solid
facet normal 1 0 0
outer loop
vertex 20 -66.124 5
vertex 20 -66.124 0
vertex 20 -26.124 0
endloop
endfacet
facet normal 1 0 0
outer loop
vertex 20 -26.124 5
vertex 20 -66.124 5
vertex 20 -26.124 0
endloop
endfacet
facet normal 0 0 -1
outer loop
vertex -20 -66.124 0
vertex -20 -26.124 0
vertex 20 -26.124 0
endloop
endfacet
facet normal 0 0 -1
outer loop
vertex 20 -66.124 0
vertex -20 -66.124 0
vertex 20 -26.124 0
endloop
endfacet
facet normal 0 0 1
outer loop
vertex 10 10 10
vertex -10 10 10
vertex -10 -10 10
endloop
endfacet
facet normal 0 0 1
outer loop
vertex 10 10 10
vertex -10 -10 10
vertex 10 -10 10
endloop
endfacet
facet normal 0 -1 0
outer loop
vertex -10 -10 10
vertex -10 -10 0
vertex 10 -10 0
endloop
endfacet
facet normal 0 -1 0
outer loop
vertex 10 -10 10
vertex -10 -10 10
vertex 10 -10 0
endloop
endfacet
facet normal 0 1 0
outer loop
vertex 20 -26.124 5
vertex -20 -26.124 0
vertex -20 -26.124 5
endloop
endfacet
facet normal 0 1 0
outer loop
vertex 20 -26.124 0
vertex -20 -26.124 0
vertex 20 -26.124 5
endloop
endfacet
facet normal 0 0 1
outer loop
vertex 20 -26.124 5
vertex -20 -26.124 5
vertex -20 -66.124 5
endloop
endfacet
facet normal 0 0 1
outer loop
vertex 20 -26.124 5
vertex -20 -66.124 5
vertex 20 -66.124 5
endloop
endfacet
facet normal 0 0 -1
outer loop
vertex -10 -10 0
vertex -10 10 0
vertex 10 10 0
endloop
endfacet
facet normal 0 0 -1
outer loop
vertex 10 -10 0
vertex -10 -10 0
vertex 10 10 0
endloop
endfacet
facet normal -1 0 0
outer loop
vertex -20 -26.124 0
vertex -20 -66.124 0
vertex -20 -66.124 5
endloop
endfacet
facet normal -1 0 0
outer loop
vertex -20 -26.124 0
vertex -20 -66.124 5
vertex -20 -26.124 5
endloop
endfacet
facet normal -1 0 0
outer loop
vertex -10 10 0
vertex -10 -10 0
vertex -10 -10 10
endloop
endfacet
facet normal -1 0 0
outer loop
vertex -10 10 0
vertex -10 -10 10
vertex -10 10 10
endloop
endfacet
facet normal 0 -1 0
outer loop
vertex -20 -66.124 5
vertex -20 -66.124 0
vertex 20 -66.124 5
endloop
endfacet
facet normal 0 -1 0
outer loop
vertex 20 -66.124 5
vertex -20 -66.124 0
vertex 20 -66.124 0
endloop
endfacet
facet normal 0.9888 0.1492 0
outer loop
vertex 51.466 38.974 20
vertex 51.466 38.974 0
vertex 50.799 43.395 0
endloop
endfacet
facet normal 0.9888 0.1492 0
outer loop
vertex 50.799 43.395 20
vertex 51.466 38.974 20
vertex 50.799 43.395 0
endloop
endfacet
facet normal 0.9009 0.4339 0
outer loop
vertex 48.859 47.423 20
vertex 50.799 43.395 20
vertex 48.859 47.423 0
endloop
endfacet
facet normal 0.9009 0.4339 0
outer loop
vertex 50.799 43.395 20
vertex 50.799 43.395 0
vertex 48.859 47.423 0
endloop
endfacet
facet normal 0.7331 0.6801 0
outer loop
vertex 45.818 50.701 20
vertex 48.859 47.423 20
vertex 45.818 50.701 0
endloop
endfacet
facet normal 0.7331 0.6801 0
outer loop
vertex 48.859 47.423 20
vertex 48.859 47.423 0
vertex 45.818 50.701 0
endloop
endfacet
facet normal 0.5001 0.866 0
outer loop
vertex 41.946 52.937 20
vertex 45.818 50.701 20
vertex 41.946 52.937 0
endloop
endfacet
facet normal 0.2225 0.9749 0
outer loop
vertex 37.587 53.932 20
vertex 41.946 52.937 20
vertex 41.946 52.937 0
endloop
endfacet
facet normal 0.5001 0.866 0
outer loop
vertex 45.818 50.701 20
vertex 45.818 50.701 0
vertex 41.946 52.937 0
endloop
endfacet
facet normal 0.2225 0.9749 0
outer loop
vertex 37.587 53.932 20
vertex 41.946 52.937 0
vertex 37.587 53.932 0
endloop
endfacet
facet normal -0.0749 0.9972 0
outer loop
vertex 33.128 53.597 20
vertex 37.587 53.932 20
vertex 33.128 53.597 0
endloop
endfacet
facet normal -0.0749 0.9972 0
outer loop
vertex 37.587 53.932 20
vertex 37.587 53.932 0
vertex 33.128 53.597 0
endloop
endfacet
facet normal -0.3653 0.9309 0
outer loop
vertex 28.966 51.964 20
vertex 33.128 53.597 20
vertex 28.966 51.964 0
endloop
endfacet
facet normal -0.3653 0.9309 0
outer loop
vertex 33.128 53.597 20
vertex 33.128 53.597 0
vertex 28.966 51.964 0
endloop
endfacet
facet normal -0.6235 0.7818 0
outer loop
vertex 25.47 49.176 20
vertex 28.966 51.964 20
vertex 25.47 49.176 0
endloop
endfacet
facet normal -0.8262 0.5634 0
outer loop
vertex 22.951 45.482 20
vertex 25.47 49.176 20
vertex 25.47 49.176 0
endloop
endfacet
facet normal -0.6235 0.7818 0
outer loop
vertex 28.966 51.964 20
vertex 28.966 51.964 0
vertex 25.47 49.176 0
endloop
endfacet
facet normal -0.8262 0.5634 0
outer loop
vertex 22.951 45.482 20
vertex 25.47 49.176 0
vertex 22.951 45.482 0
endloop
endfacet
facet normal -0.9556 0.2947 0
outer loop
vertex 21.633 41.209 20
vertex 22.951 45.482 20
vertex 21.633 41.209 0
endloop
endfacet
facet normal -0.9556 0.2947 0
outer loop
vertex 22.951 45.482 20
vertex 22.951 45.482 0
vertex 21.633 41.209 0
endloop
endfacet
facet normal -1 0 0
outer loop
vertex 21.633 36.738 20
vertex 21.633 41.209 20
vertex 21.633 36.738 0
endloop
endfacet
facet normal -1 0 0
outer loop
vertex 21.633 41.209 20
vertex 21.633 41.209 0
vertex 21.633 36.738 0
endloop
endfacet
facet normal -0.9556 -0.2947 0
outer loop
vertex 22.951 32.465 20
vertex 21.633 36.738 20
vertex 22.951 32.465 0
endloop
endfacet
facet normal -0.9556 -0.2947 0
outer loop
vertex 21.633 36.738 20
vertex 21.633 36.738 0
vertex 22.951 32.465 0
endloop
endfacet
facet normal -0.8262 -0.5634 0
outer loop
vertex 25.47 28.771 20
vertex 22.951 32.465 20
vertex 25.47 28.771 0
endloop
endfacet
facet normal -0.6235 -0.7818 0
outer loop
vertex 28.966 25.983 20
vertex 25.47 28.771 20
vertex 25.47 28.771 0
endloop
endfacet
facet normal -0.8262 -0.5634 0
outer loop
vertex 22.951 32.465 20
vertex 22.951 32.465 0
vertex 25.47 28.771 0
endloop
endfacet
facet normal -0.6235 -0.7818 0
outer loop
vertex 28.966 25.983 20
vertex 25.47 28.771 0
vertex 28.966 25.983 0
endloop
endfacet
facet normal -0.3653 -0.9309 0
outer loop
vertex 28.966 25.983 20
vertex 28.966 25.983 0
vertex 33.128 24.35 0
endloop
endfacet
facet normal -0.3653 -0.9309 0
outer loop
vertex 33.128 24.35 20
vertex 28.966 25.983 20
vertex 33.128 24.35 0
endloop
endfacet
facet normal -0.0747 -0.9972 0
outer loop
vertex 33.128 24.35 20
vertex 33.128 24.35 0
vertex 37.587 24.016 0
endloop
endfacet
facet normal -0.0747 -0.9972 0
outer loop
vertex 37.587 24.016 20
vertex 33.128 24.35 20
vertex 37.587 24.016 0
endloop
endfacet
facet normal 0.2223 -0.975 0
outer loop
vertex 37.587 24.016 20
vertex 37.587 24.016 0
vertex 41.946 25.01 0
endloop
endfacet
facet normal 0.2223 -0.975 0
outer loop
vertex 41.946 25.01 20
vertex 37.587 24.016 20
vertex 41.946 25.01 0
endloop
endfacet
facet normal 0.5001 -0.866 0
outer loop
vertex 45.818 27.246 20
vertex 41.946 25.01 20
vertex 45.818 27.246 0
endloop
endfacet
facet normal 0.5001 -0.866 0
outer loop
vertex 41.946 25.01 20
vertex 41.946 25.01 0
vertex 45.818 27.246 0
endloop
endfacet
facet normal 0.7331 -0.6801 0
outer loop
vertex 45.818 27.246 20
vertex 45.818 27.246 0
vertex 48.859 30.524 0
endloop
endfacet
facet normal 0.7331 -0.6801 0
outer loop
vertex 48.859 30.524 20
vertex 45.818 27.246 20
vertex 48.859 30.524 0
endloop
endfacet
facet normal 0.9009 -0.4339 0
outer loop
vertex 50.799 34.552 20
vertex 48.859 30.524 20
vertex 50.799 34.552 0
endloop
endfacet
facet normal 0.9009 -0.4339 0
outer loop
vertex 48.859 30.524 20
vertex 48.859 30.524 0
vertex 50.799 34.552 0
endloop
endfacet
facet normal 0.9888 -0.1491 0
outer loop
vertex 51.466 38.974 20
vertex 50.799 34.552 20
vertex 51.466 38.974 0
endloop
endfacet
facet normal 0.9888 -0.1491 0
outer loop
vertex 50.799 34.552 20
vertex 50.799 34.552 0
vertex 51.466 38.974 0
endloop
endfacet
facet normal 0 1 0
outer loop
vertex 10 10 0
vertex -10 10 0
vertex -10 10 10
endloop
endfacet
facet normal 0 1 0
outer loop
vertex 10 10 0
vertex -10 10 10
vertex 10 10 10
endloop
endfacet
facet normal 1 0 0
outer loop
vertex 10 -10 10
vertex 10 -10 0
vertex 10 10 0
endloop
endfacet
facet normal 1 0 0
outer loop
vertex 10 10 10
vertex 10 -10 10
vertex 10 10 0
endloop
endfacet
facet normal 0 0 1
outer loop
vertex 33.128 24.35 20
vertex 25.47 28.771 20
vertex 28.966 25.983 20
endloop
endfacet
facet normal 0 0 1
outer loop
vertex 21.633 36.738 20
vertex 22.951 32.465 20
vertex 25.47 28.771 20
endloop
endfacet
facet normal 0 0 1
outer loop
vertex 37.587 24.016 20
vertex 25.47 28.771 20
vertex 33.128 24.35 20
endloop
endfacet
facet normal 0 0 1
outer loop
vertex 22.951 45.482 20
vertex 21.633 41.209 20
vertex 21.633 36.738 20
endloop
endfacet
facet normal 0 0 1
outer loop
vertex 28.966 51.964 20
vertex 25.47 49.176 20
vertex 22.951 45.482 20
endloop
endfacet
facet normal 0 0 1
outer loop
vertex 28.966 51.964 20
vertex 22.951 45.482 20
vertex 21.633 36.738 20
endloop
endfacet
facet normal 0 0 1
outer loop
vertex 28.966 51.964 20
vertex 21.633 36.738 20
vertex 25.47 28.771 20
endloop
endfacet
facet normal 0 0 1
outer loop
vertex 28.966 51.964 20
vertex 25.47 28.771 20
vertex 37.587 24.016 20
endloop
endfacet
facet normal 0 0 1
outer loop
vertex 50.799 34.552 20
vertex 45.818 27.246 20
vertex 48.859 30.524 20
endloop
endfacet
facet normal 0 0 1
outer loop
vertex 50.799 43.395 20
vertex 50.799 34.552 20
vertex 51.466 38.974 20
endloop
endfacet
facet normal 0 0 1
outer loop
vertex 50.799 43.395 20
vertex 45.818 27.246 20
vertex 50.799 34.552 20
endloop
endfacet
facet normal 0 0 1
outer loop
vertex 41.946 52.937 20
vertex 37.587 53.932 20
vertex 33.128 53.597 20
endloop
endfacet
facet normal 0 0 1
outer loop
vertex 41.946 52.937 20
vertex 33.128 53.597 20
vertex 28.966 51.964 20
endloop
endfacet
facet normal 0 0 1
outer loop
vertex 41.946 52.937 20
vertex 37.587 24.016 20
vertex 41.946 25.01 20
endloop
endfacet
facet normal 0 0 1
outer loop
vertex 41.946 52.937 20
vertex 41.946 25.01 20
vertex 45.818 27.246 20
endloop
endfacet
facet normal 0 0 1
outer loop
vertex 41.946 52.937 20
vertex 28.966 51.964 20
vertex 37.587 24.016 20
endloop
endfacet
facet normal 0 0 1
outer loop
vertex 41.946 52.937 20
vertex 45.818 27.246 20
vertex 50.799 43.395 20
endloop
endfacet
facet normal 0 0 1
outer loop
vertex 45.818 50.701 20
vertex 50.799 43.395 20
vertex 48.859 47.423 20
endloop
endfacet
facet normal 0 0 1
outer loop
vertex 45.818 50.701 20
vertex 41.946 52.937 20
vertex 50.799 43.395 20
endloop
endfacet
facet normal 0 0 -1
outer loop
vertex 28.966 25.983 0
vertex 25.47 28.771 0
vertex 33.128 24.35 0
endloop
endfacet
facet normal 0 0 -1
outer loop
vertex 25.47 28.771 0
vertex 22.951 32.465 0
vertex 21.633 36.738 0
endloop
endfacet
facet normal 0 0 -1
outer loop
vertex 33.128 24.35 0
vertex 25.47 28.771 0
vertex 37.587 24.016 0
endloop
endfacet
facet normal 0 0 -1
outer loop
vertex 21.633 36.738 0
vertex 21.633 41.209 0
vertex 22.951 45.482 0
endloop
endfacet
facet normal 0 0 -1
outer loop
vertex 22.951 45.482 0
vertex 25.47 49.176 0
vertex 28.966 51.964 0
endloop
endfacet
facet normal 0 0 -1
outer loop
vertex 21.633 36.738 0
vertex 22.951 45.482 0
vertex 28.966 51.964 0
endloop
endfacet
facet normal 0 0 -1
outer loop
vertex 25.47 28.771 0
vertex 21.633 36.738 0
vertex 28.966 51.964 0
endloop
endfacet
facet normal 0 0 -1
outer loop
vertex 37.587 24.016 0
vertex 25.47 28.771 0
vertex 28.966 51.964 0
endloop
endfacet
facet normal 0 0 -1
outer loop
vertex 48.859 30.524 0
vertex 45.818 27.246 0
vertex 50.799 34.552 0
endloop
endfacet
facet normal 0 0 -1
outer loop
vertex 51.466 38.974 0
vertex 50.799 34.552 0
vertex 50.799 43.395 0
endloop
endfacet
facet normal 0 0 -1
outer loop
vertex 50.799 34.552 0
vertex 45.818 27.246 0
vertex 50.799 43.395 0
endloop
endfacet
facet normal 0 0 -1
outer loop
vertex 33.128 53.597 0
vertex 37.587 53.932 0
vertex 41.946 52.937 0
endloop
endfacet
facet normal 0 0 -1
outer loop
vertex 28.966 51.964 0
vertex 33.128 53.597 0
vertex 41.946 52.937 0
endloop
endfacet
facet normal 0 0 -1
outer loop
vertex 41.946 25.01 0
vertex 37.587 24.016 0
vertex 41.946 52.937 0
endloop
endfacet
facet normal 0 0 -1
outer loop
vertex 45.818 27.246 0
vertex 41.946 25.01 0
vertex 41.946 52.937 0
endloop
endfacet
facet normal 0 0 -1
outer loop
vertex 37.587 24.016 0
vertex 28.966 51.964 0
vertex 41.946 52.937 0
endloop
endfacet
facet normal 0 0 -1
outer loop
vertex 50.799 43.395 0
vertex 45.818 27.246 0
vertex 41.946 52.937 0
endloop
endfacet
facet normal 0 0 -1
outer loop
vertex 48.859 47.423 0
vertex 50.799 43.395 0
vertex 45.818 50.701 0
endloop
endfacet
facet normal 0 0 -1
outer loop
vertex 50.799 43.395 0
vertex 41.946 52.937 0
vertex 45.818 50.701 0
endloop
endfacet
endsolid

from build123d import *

# Parameters (mm, degrees)
F0_W     = 20
F0_H     = 20
F1_DEPTH = 10
F2_W     = 40
F2_H     = 40
F3_DEPTH = 5
F4_R     = 15
F5_DEPTH = 20


with BuildPart() as f1:
    # F0 (on Top) → F1 (new body)
    with BuildSketch(Plane.XY):
        Rectangle(F0_W, F0_H)
    extrude(amount=F1_DEPTH)


with BuildPart() as f3:
    # F2 (on Top) → F3 (new body)
    with BuildSketch(Plane.XY):
        with Locations((0, -46.124396)):
            Rectangle(F2_W, F2_H)
    extrude(amount=F3_DEPTH)


with BuildPart() as f5:
    # F4 (on Top) → F5 (new body)
    with BuildSketch(Plane.XY):
        with Locations((36.465608, 38.973559)):
            Circle(F4_R)
    extrude(amount=F5_DEPTH)


solid = Compound([f1.part, f3.part, f5.part])
